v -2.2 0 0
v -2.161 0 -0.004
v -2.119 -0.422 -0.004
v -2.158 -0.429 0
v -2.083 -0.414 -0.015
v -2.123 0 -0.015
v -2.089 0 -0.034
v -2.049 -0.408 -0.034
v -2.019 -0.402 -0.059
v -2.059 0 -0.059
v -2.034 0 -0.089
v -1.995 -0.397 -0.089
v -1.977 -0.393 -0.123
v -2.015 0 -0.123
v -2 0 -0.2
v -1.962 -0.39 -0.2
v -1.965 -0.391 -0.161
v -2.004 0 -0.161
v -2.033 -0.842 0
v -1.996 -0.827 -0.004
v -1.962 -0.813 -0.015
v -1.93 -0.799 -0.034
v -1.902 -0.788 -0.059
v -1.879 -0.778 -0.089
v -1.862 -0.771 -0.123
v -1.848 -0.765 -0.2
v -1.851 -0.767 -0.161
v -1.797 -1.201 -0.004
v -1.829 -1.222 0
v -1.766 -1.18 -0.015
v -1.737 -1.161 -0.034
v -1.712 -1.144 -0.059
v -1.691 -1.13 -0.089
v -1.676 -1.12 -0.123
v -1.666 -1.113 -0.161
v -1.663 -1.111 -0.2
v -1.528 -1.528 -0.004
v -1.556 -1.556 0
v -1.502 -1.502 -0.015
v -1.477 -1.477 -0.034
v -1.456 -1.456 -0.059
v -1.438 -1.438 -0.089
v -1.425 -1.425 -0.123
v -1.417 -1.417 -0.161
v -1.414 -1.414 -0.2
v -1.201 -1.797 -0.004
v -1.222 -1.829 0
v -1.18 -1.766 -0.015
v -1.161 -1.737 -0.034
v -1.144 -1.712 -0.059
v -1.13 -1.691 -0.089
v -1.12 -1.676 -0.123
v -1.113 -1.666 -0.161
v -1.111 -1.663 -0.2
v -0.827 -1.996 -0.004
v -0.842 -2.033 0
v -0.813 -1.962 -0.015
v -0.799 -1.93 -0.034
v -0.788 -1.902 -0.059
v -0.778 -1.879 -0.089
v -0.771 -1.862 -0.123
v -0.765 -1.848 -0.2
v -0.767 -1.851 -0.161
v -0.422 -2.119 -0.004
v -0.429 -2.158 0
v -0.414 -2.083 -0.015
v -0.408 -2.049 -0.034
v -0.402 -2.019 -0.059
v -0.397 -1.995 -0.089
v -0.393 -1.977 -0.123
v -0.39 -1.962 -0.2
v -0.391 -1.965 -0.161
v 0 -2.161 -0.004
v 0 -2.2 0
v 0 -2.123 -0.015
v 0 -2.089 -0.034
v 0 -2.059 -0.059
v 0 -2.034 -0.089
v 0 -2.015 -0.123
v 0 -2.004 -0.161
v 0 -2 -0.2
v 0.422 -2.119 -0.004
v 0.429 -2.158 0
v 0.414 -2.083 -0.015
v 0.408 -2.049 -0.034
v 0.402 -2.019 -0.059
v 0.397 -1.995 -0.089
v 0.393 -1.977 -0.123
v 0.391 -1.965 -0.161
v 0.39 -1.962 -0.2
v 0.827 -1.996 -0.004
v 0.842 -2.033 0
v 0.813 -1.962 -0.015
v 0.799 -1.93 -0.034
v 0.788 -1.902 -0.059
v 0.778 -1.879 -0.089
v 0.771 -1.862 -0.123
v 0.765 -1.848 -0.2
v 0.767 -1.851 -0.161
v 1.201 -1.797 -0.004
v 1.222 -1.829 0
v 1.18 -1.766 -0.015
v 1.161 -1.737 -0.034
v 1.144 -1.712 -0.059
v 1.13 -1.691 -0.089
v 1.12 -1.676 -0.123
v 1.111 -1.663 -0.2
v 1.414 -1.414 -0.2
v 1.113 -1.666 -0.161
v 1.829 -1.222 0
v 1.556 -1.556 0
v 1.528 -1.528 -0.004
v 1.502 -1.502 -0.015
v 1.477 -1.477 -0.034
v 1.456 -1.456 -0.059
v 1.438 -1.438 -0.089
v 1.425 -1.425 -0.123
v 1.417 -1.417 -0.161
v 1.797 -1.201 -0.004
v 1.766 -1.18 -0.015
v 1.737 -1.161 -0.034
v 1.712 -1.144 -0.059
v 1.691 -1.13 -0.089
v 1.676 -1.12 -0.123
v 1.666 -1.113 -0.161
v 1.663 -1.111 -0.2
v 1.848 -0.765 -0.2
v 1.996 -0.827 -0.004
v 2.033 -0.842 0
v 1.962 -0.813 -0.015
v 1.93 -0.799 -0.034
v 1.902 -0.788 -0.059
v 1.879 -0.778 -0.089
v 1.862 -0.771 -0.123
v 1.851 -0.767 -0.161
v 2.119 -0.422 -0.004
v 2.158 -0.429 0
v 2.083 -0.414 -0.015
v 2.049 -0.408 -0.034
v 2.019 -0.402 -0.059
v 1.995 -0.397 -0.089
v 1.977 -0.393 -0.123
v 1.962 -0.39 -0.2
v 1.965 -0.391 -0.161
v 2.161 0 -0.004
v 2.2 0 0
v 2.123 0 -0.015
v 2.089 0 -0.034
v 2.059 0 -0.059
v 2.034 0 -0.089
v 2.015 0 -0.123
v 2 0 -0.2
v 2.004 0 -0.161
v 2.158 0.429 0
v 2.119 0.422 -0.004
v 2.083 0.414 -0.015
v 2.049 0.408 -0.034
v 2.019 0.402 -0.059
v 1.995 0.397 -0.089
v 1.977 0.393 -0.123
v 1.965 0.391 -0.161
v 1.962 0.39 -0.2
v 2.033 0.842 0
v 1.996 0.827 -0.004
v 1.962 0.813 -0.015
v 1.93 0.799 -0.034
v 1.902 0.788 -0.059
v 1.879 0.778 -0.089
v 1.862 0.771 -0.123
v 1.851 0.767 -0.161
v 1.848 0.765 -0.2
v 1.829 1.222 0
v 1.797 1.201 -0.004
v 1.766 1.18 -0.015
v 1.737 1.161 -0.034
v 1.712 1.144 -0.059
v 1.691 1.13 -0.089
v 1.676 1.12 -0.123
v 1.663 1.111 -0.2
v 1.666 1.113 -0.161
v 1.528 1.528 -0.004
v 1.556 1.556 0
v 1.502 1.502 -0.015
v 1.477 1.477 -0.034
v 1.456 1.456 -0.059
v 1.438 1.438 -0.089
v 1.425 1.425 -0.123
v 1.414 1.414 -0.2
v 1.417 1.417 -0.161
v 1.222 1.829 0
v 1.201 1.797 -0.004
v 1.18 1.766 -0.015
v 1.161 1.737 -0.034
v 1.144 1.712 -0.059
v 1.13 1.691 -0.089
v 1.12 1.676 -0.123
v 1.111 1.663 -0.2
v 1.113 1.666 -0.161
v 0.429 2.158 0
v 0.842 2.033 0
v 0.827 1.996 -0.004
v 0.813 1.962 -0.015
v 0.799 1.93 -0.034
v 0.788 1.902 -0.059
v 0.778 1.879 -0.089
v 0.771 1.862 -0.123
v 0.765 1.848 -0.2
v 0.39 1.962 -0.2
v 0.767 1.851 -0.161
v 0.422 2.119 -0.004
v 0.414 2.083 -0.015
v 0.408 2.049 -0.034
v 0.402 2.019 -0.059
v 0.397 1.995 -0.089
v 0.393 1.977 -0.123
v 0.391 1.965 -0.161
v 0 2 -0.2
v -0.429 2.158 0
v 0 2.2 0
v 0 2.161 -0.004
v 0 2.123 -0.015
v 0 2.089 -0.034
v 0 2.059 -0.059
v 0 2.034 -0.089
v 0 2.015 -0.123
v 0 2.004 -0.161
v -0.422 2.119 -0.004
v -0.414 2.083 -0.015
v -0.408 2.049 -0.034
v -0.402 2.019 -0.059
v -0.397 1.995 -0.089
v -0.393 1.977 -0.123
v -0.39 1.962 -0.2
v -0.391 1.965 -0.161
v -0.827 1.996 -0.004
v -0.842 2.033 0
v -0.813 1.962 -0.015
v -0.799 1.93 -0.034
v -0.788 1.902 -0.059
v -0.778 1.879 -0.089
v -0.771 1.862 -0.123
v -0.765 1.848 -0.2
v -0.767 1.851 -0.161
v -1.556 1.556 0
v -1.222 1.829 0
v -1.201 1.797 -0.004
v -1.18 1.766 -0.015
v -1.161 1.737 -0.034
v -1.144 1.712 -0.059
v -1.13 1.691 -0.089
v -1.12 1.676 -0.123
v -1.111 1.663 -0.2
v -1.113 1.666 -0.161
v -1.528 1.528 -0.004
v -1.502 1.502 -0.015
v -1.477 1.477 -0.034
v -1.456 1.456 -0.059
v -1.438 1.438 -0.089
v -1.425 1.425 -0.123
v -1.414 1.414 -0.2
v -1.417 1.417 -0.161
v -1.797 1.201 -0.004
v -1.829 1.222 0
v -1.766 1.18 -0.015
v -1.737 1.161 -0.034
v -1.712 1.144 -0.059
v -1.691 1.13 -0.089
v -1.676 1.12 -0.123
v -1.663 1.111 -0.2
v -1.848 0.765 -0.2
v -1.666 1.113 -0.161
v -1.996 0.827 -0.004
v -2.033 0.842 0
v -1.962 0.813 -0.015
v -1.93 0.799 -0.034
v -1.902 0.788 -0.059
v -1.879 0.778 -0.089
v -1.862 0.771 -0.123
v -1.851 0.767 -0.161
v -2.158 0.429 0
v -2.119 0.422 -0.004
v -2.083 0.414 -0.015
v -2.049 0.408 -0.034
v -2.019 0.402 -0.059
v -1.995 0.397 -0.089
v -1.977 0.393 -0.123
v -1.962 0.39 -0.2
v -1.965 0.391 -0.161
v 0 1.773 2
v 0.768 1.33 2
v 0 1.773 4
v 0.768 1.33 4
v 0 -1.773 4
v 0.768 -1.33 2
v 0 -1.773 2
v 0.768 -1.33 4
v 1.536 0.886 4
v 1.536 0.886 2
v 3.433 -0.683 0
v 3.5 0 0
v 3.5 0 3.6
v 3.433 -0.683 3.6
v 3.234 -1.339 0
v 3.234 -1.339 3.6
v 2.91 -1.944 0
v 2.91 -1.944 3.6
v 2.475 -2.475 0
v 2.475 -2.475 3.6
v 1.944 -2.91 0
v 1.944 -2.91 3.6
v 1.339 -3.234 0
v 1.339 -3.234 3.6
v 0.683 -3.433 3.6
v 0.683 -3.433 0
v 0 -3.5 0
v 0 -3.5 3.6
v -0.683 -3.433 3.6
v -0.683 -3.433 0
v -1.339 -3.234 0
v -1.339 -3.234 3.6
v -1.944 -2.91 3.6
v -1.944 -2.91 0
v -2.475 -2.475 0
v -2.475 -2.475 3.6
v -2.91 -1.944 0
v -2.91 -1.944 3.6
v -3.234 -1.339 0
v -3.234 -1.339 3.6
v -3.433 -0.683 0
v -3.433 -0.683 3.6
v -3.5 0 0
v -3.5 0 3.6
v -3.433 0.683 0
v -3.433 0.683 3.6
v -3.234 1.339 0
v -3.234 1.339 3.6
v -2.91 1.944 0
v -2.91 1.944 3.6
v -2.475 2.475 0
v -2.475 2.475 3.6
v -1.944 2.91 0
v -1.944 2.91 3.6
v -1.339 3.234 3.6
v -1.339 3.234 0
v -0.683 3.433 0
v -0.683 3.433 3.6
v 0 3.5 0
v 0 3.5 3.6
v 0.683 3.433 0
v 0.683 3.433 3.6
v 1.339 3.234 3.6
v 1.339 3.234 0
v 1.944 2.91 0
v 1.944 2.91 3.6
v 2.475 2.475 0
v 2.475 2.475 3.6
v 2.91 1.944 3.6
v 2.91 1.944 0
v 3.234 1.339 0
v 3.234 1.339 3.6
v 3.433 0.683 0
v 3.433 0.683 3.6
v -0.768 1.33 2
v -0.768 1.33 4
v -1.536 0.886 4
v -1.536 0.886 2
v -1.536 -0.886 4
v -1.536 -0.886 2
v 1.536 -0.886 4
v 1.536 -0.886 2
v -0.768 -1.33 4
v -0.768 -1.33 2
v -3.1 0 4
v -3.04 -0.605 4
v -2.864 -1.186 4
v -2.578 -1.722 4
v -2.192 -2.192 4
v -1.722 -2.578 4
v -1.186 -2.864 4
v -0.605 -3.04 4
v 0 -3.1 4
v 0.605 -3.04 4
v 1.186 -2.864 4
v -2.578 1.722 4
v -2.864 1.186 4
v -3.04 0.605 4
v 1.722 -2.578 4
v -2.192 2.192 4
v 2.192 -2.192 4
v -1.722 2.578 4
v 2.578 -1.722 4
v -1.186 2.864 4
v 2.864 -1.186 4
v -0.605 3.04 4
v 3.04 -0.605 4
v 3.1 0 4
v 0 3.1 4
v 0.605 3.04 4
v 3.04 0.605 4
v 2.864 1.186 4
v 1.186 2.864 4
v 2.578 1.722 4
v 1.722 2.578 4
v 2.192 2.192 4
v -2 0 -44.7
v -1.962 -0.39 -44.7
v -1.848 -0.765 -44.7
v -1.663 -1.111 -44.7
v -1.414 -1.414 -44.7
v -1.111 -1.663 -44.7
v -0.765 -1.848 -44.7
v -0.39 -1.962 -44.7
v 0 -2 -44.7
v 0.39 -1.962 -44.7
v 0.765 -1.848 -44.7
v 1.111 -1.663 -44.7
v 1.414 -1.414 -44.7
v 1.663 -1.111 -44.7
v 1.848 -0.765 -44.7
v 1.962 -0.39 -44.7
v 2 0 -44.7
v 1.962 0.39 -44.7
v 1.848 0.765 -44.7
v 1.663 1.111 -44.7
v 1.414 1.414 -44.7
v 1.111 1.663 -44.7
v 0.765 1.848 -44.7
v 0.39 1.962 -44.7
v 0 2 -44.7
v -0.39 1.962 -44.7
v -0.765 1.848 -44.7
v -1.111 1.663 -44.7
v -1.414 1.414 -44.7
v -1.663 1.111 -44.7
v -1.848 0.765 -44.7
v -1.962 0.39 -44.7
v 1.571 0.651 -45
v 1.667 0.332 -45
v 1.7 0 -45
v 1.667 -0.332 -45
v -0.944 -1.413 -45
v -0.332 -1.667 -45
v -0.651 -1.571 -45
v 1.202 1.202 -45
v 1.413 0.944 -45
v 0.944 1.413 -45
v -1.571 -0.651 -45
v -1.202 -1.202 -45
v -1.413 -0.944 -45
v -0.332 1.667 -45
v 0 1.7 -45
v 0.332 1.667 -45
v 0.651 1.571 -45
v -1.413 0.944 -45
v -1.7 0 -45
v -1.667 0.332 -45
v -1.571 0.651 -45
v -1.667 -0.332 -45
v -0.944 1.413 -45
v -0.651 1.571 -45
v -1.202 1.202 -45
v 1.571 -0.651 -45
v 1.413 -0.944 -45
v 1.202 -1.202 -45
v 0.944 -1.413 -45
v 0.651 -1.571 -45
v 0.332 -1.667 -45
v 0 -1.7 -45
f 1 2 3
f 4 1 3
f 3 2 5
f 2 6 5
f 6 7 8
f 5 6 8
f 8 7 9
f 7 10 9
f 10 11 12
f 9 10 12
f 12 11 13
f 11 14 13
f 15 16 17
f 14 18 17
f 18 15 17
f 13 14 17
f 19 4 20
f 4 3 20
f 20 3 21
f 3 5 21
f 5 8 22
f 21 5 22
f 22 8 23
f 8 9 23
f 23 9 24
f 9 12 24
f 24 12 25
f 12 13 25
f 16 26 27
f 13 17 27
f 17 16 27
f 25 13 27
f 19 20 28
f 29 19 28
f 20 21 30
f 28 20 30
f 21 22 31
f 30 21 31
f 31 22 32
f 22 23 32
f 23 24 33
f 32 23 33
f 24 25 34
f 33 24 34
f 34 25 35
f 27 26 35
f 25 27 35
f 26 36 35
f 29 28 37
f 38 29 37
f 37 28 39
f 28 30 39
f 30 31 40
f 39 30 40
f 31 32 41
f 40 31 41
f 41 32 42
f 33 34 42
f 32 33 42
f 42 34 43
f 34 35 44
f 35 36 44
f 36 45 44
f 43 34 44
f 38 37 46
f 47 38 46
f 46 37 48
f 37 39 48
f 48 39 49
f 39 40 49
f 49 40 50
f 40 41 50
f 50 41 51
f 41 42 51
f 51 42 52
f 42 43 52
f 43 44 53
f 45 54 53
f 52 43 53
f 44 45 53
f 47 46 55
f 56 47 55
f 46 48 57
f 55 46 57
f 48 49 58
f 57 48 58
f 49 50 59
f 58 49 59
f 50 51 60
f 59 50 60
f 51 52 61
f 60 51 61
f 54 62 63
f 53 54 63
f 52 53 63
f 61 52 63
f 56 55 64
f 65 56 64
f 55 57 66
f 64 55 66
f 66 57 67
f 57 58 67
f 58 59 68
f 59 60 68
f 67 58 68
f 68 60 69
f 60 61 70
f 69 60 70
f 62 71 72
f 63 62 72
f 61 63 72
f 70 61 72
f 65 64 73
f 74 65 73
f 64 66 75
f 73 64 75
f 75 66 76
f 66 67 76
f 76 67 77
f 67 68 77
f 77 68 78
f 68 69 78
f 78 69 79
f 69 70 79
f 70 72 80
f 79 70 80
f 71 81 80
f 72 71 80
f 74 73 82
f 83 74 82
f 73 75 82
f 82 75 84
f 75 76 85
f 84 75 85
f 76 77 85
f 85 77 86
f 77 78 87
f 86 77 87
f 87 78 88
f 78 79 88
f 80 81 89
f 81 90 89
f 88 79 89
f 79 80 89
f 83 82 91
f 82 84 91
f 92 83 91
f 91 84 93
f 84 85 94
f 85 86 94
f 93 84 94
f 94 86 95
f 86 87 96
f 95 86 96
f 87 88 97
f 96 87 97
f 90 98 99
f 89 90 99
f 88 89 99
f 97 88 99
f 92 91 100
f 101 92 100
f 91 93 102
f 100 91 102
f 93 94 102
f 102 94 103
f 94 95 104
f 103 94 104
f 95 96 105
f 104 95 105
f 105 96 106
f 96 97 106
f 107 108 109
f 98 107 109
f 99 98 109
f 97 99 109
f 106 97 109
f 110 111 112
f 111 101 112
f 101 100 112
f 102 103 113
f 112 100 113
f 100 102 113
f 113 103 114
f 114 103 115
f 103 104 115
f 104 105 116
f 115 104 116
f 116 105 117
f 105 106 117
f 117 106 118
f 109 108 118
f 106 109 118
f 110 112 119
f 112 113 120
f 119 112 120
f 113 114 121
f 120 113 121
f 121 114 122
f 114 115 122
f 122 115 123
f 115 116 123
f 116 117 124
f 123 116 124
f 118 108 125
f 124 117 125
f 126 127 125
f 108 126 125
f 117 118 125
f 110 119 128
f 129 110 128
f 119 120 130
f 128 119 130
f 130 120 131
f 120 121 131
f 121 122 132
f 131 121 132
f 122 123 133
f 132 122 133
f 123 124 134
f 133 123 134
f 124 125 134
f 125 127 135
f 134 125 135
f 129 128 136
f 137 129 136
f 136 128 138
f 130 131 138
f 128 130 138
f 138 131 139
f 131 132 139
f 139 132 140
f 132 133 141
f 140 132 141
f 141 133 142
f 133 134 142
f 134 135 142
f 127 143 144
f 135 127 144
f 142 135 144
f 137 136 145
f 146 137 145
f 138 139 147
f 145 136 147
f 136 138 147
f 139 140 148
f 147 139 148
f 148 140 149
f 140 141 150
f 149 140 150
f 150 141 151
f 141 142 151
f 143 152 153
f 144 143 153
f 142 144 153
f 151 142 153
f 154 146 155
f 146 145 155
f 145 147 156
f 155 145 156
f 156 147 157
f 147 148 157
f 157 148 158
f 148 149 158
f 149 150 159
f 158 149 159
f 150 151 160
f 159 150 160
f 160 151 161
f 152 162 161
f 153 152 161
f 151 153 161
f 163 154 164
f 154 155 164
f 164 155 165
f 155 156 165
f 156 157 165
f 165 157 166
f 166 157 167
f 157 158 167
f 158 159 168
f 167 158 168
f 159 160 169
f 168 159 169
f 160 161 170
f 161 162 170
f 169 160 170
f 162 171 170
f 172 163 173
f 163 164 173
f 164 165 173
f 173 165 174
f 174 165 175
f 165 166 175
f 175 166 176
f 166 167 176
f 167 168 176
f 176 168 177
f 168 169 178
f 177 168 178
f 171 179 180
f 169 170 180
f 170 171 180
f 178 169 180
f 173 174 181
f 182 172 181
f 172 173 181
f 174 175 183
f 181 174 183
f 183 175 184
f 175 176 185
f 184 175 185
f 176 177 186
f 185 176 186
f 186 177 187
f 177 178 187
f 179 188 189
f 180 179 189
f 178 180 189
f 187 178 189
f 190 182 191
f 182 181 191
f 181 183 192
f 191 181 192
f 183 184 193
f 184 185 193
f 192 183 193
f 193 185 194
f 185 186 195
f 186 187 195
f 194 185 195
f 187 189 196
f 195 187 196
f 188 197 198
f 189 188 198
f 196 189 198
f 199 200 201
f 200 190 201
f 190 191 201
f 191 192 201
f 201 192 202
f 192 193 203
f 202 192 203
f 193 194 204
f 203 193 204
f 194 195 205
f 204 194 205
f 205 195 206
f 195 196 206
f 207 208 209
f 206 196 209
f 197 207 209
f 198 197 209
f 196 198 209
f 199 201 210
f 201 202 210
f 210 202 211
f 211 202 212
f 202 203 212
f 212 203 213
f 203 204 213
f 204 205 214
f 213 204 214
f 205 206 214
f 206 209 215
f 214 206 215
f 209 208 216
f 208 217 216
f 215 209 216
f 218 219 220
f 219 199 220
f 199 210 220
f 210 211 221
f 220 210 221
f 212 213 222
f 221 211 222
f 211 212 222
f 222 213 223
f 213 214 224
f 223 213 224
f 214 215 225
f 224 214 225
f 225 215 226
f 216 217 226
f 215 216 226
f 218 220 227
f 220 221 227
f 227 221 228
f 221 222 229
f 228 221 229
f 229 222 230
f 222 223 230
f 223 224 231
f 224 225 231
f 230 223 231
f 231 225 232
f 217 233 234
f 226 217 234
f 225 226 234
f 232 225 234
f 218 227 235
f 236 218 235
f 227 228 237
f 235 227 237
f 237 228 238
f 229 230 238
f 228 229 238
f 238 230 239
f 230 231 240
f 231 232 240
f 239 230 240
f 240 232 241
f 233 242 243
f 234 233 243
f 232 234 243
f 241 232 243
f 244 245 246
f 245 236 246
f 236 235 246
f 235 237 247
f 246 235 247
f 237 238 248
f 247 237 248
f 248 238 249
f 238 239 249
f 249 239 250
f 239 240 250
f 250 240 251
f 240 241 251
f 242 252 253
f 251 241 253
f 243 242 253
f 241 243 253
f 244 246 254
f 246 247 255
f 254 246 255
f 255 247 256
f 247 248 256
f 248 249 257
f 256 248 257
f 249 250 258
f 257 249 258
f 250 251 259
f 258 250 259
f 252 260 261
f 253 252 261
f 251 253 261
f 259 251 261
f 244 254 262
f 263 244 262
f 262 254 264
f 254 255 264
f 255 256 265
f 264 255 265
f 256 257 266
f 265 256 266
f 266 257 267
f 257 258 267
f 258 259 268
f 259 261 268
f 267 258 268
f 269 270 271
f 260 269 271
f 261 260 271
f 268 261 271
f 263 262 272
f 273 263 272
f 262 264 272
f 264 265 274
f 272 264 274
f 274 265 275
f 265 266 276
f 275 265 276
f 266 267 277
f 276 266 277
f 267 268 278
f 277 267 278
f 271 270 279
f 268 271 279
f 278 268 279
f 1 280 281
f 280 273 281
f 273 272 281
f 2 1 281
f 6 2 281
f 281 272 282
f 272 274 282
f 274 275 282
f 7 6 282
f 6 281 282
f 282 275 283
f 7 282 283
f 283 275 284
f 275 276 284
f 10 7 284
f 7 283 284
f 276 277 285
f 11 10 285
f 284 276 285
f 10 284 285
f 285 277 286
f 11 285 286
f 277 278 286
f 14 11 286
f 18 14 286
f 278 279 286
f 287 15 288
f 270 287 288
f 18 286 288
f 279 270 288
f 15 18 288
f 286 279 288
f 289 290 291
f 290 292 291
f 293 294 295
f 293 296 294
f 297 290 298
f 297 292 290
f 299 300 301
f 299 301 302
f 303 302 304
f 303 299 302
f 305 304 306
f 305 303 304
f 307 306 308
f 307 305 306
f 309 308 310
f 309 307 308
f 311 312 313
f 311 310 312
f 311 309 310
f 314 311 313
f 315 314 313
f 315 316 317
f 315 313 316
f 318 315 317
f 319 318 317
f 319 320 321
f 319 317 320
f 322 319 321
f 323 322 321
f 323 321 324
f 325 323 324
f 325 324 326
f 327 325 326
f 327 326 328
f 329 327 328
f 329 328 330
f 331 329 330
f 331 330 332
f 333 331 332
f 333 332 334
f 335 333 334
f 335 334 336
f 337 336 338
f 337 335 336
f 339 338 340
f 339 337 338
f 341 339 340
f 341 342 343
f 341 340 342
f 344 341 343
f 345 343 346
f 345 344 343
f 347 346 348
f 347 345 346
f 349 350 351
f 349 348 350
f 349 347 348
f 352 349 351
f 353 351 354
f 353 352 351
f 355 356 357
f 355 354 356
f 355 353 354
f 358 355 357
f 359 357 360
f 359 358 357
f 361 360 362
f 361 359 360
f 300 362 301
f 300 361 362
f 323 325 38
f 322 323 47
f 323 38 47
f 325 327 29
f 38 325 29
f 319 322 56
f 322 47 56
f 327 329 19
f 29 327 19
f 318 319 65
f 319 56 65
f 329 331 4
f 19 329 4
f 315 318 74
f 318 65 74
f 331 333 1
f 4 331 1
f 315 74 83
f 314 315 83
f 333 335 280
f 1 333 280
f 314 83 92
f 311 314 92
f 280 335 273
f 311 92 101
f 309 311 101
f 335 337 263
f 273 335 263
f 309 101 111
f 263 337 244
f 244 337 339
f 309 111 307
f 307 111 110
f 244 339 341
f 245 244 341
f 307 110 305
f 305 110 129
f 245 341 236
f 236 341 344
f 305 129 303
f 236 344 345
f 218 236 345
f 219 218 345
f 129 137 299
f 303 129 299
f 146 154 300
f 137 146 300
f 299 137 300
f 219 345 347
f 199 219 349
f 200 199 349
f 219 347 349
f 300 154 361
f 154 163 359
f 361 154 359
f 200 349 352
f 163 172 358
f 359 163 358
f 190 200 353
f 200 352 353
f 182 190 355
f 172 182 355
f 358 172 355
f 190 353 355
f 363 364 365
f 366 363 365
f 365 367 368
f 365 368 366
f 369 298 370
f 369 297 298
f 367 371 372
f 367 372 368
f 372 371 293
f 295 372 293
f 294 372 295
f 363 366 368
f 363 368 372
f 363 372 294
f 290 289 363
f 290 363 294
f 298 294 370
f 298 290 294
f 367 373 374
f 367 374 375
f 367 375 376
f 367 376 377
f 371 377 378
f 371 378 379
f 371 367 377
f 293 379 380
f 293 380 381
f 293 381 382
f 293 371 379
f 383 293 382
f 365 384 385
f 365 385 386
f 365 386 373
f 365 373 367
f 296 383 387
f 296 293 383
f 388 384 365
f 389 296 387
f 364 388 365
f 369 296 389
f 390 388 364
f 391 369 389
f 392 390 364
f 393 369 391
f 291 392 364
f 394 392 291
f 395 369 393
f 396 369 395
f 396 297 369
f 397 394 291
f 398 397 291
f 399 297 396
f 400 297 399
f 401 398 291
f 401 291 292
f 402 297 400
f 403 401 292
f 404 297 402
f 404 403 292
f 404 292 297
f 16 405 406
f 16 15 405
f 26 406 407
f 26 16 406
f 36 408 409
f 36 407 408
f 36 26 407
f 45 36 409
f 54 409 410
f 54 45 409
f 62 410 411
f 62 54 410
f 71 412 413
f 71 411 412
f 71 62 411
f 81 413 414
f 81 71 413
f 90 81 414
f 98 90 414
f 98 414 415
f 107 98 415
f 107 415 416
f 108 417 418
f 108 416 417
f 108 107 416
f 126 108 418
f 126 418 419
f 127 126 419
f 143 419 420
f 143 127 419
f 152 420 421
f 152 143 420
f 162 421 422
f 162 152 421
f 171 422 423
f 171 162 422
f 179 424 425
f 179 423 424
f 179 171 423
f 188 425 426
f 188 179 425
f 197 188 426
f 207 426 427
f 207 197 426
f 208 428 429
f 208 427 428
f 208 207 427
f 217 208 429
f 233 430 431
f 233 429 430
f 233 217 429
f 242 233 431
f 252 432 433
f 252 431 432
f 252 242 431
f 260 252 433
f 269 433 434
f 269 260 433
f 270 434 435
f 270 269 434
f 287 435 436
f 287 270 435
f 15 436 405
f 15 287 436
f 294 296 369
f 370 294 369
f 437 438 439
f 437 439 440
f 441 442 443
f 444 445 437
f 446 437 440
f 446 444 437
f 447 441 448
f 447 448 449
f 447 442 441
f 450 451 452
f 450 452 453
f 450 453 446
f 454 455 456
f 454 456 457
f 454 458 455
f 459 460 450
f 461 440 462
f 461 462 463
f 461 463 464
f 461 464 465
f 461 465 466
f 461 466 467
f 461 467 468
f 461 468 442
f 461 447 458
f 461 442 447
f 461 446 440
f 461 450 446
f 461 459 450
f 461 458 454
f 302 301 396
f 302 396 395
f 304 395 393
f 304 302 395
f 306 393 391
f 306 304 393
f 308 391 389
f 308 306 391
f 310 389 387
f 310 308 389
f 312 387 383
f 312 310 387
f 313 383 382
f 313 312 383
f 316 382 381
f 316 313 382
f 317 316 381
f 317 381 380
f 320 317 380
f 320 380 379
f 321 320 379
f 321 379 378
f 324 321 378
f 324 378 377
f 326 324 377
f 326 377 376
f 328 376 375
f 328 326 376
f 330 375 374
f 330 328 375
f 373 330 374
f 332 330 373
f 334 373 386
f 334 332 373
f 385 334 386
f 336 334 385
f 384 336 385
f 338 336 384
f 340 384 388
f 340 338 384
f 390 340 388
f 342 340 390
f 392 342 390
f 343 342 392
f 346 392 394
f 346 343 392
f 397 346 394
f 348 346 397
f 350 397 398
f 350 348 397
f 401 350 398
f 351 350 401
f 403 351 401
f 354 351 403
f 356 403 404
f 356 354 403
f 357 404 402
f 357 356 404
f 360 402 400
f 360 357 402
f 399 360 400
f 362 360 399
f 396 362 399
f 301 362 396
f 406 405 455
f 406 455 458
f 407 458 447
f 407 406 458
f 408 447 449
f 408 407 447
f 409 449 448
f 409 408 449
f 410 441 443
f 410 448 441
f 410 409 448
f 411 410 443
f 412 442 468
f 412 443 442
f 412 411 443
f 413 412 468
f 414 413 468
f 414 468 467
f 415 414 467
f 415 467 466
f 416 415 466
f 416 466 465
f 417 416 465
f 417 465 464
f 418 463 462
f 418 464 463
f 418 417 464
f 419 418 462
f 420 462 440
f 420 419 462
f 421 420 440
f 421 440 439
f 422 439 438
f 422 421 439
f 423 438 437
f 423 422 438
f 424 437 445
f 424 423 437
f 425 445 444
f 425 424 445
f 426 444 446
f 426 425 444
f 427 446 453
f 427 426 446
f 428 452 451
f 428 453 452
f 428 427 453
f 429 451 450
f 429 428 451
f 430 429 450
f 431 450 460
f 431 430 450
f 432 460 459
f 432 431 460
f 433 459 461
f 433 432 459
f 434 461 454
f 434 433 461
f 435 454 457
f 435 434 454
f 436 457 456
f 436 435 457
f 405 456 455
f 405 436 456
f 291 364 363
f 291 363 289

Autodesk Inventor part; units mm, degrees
ref_plane "YZ Plane" through (0, 0, 0) normal (1, 0, 0) x (0, 1, 0)
ref_plane "XZ Plane" through (0, 0, 0) normal (0, 1, 0) x (-1, 0, 0)
ref_plane "XY Plane" through (0, 0, 0) normal (0, 0, 1) x (1, 0, 0)
sketch "Szkic1" plane through (0, 0, 0) normal (0, 0, 1) x (1, 0, 0)
  circle A0 centre (0, 0) radius 3.5
  dimension "d0" = 7
extrude "Wyciągnięcie proste1" add sketch "Szkic1" along normal blind 4
chamfer "Faza1" distance 0.4 angle 45 1 edges at (-3.5, 0, 4)
sketch "Szkic2" plane through (0, 0, 4) normal (0, 0, 1) x (1, 0, 0)
  point P0 (0, 0)
sketch "Szkic3" plane through (0, 0, 4) normal (0, 0, 1) x (1, 0, 0)
  circle A0 centre (0, 0) radius 1.5355
  line L0 (1.5355, 0) -> (1.5355, 0.8865)
  line L1 (1.5355, 0) -> (1.5355, -0.8865)
  line L2 (0.7677, -1.3298) -> (1.5355, -0.8865)
  line L3 (0.7677, -1.3298) -> (0, -1.773)
  line L4 (0.7678, 1.3298) -> (0, 1.773)
  line L5 (-0.7677, 1.3298) -> (0, 1.773)
  line L6 (-1.5355, 0) -> (-1.5355, 0.8865)
  line L7 (-0.7677, 1.3298) -> (-1.5355, 0.8865)
  line L8 (-0.7678, -1.3298) -> (0, -1.773)
  line L9 (0.7678, 1.3298) -> (1.5355, 0.8865)
  line L10 (-1.5355, 0) -> (-1.5355, -0.8865)
  line L11 (-0.7678, -1.3298) -> (-1.5355, -0.8865)
  dimension "d6" = 3.071
extrude "Wyciągnięcie proste2" cut sketch "Szkic3" against normal blind 2
sketch "Szkic4" plane through (0, 0, 0) normal (0, 0, -1) x (-1, 0, 0)
  circle A0 centre (0, 0) radius 2
  dimension "d13" = 4
extrude "Wyciągnięcie proste3" add sketch "Szkic4" along normal blind 45
fillet "Zaokrąglenie1" radius 0.2 1 edges at (2, 0, 0)
sketch "Szkic5" plane through (0, 0, 0) normal (0, 0, -1) x (-1, 0, 0)
  point P0 (0, 0)
chamfer "Faza2" distance 0.3 angle 45 1 edges at (2, 0, -45)
sketch "Szkic6" plane through (0, 0, -45) normal (0, 0, -1) x (-1, 0, 0)
  point P0 (0, 0)
properties part number "sruba"
